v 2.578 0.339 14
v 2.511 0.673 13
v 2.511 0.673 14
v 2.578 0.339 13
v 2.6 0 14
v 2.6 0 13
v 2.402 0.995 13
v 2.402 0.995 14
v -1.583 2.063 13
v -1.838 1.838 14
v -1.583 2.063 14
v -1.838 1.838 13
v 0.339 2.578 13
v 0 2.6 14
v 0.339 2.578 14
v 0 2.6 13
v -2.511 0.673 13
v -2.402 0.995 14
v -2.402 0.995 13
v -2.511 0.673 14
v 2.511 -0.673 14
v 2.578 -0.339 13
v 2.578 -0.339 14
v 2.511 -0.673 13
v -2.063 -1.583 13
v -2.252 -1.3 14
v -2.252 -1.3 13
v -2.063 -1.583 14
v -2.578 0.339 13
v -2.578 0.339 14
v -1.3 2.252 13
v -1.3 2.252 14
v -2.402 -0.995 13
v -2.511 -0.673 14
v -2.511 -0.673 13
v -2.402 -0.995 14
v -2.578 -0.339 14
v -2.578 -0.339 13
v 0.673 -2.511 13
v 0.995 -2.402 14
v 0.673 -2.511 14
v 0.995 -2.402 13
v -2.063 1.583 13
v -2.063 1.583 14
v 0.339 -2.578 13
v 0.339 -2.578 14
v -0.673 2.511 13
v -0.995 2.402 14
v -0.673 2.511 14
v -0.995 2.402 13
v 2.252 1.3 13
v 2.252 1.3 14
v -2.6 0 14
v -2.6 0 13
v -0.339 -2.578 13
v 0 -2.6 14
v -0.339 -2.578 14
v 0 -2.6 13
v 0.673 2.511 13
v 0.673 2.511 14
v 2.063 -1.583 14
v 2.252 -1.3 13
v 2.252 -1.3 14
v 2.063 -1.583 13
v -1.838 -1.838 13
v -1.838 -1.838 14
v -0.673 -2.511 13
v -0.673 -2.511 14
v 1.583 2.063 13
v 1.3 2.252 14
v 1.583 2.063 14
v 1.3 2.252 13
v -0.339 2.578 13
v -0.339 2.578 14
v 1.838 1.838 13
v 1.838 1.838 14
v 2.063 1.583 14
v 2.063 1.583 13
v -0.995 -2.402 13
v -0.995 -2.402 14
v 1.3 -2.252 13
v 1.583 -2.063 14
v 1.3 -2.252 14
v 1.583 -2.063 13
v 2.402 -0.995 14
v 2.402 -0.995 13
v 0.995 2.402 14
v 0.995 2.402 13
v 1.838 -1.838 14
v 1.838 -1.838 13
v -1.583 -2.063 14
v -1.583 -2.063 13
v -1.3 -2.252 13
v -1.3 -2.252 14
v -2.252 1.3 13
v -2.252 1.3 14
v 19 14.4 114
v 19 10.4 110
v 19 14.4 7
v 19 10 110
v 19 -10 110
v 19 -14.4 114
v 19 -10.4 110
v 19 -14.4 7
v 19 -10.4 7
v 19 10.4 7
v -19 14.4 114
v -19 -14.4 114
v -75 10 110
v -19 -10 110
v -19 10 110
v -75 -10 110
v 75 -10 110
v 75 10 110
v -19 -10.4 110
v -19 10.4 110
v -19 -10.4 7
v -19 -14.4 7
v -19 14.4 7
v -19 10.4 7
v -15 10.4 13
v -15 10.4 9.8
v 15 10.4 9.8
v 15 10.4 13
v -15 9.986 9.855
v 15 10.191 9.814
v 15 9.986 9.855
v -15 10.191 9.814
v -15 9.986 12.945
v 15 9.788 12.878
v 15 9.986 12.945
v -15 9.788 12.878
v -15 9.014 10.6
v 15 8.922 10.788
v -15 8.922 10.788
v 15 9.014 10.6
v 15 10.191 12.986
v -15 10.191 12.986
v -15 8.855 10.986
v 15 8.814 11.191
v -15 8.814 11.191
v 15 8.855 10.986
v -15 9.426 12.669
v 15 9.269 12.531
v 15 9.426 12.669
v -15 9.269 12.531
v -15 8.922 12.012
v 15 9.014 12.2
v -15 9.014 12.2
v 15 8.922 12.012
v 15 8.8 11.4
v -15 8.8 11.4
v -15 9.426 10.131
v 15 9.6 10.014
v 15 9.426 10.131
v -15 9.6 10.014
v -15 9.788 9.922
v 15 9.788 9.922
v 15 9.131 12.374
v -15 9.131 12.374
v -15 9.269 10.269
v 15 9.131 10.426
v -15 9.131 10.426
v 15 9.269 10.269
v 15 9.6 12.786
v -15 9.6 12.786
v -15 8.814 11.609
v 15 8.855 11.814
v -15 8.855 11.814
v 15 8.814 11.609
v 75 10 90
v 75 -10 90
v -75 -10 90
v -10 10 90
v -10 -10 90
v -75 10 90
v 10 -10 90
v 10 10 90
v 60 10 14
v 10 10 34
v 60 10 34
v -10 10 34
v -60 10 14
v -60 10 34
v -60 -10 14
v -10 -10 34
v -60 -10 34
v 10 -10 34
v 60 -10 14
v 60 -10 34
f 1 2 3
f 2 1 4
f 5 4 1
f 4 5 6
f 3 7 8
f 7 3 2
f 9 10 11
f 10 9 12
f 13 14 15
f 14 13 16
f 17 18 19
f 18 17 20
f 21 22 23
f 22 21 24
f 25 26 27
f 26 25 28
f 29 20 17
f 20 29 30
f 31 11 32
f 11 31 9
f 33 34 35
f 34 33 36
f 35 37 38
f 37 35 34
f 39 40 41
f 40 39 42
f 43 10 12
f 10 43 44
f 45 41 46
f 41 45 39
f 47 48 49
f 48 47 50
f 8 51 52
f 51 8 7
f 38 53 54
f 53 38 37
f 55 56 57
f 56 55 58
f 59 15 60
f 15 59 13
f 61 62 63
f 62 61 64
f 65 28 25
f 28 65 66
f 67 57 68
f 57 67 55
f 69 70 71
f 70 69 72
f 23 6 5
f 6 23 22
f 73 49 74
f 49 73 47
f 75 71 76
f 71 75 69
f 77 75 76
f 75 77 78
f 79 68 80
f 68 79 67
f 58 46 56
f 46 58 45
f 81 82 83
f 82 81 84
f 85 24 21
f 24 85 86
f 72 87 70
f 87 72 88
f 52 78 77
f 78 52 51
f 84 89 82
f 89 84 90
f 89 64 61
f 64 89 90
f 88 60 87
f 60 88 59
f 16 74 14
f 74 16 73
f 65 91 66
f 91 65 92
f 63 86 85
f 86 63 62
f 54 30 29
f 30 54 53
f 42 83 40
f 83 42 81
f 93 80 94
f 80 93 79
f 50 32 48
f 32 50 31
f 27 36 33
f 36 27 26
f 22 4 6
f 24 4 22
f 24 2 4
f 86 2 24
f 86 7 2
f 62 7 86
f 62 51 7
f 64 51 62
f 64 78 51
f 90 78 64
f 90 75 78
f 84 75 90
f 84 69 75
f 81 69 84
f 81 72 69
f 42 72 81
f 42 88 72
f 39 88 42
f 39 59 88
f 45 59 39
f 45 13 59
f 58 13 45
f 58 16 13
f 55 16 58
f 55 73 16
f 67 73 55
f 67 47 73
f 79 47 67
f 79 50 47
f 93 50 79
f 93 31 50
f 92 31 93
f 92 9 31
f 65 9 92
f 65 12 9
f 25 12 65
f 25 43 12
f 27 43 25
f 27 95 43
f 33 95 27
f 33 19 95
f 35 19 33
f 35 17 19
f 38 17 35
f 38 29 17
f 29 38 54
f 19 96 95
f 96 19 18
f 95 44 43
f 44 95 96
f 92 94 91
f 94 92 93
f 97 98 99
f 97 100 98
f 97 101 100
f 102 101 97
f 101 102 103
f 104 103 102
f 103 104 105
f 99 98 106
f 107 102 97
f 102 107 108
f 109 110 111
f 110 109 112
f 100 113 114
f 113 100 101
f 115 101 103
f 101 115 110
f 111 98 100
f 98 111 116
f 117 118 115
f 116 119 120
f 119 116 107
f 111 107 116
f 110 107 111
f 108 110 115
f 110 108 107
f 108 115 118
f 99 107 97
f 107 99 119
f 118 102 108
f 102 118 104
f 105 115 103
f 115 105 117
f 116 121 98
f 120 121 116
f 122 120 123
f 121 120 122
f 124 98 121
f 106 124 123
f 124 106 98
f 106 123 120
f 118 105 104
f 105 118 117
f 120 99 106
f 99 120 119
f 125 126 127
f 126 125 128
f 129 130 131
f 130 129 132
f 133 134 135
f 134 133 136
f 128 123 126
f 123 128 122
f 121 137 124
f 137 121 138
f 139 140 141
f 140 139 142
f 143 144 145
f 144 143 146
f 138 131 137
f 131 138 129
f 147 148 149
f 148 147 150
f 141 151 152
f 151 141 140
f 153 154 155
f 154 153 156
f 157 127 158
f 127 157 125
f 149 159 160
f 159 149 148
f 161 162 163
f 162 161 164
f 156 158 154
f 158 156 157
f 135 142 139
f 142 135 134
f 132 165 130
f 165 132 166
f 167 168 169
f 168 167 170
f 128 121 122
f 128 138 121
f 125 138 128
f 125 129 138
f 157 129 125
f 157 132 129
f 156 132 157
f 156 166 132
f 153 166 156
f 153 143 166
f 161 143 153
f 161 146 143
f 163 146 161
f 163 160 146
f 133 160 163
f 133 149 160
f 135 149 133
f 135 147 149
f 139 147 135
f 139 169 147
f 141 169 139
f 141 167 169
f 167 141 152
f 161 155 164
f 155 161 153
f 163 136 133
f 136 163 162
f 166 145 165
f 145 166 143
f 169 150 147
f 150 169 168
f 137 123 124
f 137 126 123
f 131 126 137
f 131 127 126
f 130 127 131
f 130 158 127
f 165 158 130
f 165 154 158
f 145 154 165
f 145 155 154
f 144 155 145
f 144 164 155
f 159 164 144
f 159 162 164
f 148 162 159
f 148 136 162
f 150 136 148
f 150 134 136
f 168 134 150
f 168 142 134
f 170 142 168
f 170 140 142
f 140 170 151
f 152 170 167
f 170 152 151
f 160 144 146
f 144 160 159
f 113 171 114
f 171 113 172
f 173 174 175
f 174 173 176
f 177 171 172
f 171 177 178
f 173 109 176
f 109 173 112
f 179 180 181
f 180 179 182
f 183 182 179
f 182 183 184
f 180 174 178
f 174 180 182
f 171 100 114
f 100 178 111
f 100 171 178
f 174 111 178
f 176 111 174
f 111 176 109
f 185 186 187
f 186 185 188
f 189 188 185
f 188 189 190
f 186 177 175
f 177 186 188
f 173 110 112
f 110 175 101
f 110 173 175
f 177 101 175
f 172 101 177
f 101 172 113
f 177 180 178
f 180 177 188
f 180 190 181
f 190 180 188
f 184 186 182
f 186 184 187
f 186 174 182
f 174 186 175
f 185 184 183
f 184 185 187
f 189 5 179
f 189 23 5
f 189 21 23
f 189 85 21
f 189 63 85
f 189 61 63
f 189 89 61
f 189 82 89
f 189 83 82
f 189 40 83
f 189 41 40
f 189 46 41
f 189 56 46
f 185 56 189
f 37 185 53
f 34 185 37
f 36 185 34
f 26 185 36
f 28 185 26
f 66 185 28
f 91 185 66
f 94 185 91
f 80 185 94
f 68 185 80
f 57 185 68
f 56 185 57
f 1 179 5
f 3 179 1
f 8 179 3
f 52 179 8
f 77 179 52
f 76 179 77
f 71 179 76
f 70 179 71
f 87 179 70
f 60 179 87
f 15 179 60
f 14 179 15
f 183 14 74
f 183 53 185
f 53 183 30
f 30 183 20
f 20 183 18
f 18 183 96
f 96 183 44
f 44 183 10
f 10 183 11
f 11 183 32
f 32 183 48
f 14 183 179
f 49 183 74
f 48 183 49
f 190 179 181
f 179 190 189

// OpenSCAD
// 乒乓球围挡旋转脚防转卡子 v0.1
//
// 设计意图：每只可旋转支撑脚使用一枚 PETG 卡子。卡子从上方落下，
// 上端的反向 U 槽套住 20 mm 长向方管；两条连续侧肋把防转力矩传到
// 下端，单侧的向内扣舌从脚管边缘下方托住/抱住脚，限制脚从工作角度
// 自行旋转。SIDE=+1/-1 可生成相反方向的内扣，左右脚可镜像使用。
//
// 单位：mm。这个文件是独立原型，不修改当前 net_stand.scad 主线。
// 20x20 方管、螺丝规格、旋转轴距和脚端外形仍需实物量测后冻结。

$fn = 48;

PART = "assembly_deployed";
SIDE = 1;

// ---------------------------
// 机械契约 / 可调参数
// ---------------------------

tube_size = 20;
// 这是两侧总和的名义配合余量：inner = 20 + 0.8 = 20.8 mm。
// PETG 首样建议先用该值，实际插入/摇摆后再按测量值改。
tube_clearance_total = 0.8;
tube_inner = tube_size + tube_clearance_total;
guard_wall = 4.0;
guard_outer_depth = tube_inner + 2 * guard_wall;
guard_width_x = 38;

// 预览中的结构基准。长方向为 x，厚度/脚方向为 y，竖直为 z。
rail_center_z = 100;
rail_bottom_z = rail_center_z - tube_size / 2;
rail_top_z = rail_center_z + tube_size / 2;

// 上套槽是反向 U：顶板保留，底部开放，允许从 z+ 套到上方长向管。
saddle_bottom_z = rail_bottom_z - 6;
saddle_top_z = rail_top_z + guard_wall;

// 下端导向/抱脚区。下部横向内扣是故意的局部结构，不把整个窗口堵死。
spine_bottom_z = 7;
hook_z = 8;
hook_height_z = 5.0;
hook_depth_y = 4.0;
hook_bead_d = 3.2;
hook_bead_width_x = guard_width_x - 8;

// 预览用的假定装配包络；不是打印件尺寸真值。
pivot_z = 24;
foot_length_y = 120;
preview_rail_length_x = 150;
preview_post_top_clearance = 0;

assert(SIDE == 1 || SIDE == -1, "SIDE 必须是 +1 或 -1");
assert(tube_size > 0 && tube_clearance_total >= 0);
assert(guard_wall >= 3.2, "PETG 首样的侧壁不应小于 3.2 mm");
assert(guard_outer_depth > tube_inner);
assert(saddle_bottom_z < rail_bottom_z && saddle_top_z > rail_top_z);
assert(hook_z + hook_height_z <= pivot_z - tube_size / 2 + 1.0,
       "下扣高度与脚管底边的预览关系不一致");

function side_value(positive, negative) = SIDE > 0 ? positive : negative;

module block(size, center = [0, 0, 0]) {
    translate(center) cube(size, center = true);
}

module side_wall(y_sign, z0, z1) {
    y_center = y_sign * (guard_outer_depth / 2 - guard_wall / 2);
    block(
        [guard_width_x, guard_wall, z1 - z0],
        [0, y_center, (z0 + z1) / 2]
    );
}

// 上方套入的反向 U 槽。下侧不封，安装时可沿 z- 落下，长向管进入内腔。
module top_saddle() {
    block(
        [guard_width_x, guard_outer_depth, guard_wall],
        [0, 0, saddle_top_z - guard_wall / 2]
    );
    side_wall(-1, saddle_bottom_z, saddle_top_z);
    side_wall(1, saddle_bottom_z, saddle_top_z);
}

// 两侧连续侧肋：从上套槽一直落到脚的抱持区，不把防转力矩交给薄薄的
// 单点卡舌。中间保持 20.8 mm 的开放窗口。
module continuous_spines() {
    side_wall(-1, spine_bottom_z, saddle_bottom_z);
    side_wall(1, spine_bottom_z, saddle_bottom_z);
}

// 单侧向内扣。舌根与侧肋重叠，内端加圆条状小鼻尖，作为“抱住脚边”的
// 第一版入口/防脱特征；SIDE 镜像后可选择更适合实际脚的受力方向。
module inward_hook() {
    hook_outer_y = side_value(guard_outer_depth / 2, -guard_outer_depth / 2);
    hook_center_y = side_value(
        guard_outer_depth / 2 - hook_depth_y / 2,
        -guard_outer_depth / 2 + hook_depth_y / 2
    );
    block(
        [guard_width_x, hook_depth_y, hook_height_z],
        [0, hook_center_y, hook_z + hook_height_z / 2]
    );

    // 鼻尖中心落在内扣舌的内边，避免用尖薄平板直接刮擦 PETG/方管。
    bead_center_y = side_value(
        guard_outer_depth / 2 - hook_depth_y,
        -guard_outer_depth / 2 + hook_depth_y
    );
    translate([0, bead_center_y, hook_z + hook_height_z - hook_bead_d / 2])
        rotate([0, 90, 0])
        cylinder(d = hook_bead_d, h = hook_bead_width_x, center = true);
}

module guard_clip() {
    union() {
        top_saddle();
        continuous_spines();
        inward_hook();
    }
}

// 一个短的下扣试装片，先验证 20x20 方管进入窗口和内扣方向；后续可单独
// 导出它作为首件，而不必先打印整只长卡子。
module hook_test_coupon() {
    coupon_width_x = 34;
    coupon_depth_y = guard_outer_depth;
    coupon_height_z = 24;
    side_y = side_value(
        coupon_depth_y / 2 - guard_wall / 2,
        -coupon_depth_y / 2 + guard_wall / 2
    );
    // 两侧导向墙
    block([coupon_width_x, guard_wall, coupon_height_z], [0, -coupon_depth_y / 2 + guard_wall / 2, coupon_height_z / 2]);
    block([coupon_width_x, guard_wall, coupon_height_z], [0, coupon_depth_y / 2 - guard_wall / 2, coupon_height_z / 2]);
    // 底部局部托台和同样的内扣舌
    block([coupon_width_x, coupon_depth_y, guard_wall], [0, 0, guard_wall / 2]);
    translate([0, side_y, 13])
        block([coupon_width_x, hook_depth_y, hook_height_z]);
    translate([0, side_value(coupon_depth_y / 2 - hook_depth_y, -coupon_depth_y / 2 + hook_depth_y), 16])
        rotate([0, 90, 0])
        cylinder(d = hook_bead_d, h = coupon_width_x - 8, center = true);
}

// ---------------------------
// 装配预览包络（不进入 STL）
// ---------------------------

module square_tube_x(length, z_center, tube_color = [0.68, 0.70, 0.73]) {
    color(tube_color)
        translate([0, 0, z_center])
            cube([length, tube_size, tube_size], center = true);
}

module square_tube_z(z0, z1, tube_color = [0.58, 0.60, 0.64]) {
    color(tube_color)
        translate([0, 0, (z0 + z1) / 2])
            cube([tube_size, tube_size, z1 - z0], center = true);
}

module rotating_foot(angle_deg, tube_color = [0.50, 0.52, 0.56]) {
    color(tube_color)
        rotate([0, 0, angle_deg])
            translate([0, 0, pivot_z])
                cube([tube_size, foot_length_y, tube_size], center = true);
}

module pivot_hardware() {
    // 仅作 M4~M5 轴线位置示意；实际孔径、螺丝长度和螺母 AF 待实测。
    color([0.78, 0.80, 0.84])
        translate([0, 0, pivot_z - 11])
            cylinder(d = 5.2, h = 34, center = false);
    color([0.82, 0.68, 0.18])
        translate([0, 0, pivot_z + 10])
            cylinder(d = 9.0, h = 5, $fn = 6, center = false);
}

module preview_clip(alpha = 0.78) {
    color([0.95, 0.36, 0.08], alpha) guard_clip();
}

module assembly_deployed() {
    square_tube_x(preview_rail_length_x, rail_center_z);
    square_tube_z(pivot_z + tube_size / 2, rail_bottom_z + preview_post_top_clearance);
    // 工作状态：脚与围挡长方向约 90°，形成厚度方向支撑。
    rotating_foot(90);
    pivot_hardware();
    preview_clip(0.72);
}

module assembly_folded() {
    square_tube_x(preview_rail_length_x, rail_center_z);
    square_tube_z(pivot_z + tube_size / 2, rail_bottom_z + preview_post_top_clearance);
    // 收纳状态：脚旋到与长向上管平行，仅用于说明需要被限位的自由度。
    rotating_foot(0, [0.40, 0.42, 0.46]);
    pivot_hardware();
    preview_clip(0.42);
}

module clip_cutaway() {
    // 预览专用：取 x 中心的薄截面，直接显示 y-z 方向的装入路径。
    // 这不是打印实体，也不会改变 clip STL。
    intersection() {
        guard_clip();
        translate([0, 0, 60])
            cube([10, guard_outer_depth + 12, 130], center = true);
    }
}

module fit_section() {
    // 透明上下文只用于显示方管如何进入上槽、脚边如何被下扣托住。
    color([0.70, 0.72, 0.75, 0.68])
        translate([0, 0, rail_center_z])
            cube([guard_width_x - 4, tube_size, tube_size], center = true);
    color([0.48, 0.50, 0.54, 0.68])
        translate([0, 0, pivot_z])
            cube([tube_size, tube_size, tube_size], center = true);
    color([0.95, 0.36, 0.08])
        clip_cutaway();
}

module print_orientation() {
    // 侧面平放：原模型 y 方向成为打印高度，目标是不需要大面积支撑。
    rotate([90, 0, 0]) guard_clip();
}

if (PART == "clip") {
    guard_clip();
} else if (PART == "clip_cutaway") {
    clip_cutaway();
} else if (PART == "hook_test_coupon") {
    hook_test_coupon();
} else if (PART == "fit_section") {
    fit_section();
} else if (PART == "assembly_deployed") {
    assembly_deployed();
} else if (PART == "assembly_folded") {
    assembly_folded();
} else if (PART == "print_orientation") {
    print_orientation();
} else {
    echo("未知 PART，使用 clip");
    guard_clip();
}
